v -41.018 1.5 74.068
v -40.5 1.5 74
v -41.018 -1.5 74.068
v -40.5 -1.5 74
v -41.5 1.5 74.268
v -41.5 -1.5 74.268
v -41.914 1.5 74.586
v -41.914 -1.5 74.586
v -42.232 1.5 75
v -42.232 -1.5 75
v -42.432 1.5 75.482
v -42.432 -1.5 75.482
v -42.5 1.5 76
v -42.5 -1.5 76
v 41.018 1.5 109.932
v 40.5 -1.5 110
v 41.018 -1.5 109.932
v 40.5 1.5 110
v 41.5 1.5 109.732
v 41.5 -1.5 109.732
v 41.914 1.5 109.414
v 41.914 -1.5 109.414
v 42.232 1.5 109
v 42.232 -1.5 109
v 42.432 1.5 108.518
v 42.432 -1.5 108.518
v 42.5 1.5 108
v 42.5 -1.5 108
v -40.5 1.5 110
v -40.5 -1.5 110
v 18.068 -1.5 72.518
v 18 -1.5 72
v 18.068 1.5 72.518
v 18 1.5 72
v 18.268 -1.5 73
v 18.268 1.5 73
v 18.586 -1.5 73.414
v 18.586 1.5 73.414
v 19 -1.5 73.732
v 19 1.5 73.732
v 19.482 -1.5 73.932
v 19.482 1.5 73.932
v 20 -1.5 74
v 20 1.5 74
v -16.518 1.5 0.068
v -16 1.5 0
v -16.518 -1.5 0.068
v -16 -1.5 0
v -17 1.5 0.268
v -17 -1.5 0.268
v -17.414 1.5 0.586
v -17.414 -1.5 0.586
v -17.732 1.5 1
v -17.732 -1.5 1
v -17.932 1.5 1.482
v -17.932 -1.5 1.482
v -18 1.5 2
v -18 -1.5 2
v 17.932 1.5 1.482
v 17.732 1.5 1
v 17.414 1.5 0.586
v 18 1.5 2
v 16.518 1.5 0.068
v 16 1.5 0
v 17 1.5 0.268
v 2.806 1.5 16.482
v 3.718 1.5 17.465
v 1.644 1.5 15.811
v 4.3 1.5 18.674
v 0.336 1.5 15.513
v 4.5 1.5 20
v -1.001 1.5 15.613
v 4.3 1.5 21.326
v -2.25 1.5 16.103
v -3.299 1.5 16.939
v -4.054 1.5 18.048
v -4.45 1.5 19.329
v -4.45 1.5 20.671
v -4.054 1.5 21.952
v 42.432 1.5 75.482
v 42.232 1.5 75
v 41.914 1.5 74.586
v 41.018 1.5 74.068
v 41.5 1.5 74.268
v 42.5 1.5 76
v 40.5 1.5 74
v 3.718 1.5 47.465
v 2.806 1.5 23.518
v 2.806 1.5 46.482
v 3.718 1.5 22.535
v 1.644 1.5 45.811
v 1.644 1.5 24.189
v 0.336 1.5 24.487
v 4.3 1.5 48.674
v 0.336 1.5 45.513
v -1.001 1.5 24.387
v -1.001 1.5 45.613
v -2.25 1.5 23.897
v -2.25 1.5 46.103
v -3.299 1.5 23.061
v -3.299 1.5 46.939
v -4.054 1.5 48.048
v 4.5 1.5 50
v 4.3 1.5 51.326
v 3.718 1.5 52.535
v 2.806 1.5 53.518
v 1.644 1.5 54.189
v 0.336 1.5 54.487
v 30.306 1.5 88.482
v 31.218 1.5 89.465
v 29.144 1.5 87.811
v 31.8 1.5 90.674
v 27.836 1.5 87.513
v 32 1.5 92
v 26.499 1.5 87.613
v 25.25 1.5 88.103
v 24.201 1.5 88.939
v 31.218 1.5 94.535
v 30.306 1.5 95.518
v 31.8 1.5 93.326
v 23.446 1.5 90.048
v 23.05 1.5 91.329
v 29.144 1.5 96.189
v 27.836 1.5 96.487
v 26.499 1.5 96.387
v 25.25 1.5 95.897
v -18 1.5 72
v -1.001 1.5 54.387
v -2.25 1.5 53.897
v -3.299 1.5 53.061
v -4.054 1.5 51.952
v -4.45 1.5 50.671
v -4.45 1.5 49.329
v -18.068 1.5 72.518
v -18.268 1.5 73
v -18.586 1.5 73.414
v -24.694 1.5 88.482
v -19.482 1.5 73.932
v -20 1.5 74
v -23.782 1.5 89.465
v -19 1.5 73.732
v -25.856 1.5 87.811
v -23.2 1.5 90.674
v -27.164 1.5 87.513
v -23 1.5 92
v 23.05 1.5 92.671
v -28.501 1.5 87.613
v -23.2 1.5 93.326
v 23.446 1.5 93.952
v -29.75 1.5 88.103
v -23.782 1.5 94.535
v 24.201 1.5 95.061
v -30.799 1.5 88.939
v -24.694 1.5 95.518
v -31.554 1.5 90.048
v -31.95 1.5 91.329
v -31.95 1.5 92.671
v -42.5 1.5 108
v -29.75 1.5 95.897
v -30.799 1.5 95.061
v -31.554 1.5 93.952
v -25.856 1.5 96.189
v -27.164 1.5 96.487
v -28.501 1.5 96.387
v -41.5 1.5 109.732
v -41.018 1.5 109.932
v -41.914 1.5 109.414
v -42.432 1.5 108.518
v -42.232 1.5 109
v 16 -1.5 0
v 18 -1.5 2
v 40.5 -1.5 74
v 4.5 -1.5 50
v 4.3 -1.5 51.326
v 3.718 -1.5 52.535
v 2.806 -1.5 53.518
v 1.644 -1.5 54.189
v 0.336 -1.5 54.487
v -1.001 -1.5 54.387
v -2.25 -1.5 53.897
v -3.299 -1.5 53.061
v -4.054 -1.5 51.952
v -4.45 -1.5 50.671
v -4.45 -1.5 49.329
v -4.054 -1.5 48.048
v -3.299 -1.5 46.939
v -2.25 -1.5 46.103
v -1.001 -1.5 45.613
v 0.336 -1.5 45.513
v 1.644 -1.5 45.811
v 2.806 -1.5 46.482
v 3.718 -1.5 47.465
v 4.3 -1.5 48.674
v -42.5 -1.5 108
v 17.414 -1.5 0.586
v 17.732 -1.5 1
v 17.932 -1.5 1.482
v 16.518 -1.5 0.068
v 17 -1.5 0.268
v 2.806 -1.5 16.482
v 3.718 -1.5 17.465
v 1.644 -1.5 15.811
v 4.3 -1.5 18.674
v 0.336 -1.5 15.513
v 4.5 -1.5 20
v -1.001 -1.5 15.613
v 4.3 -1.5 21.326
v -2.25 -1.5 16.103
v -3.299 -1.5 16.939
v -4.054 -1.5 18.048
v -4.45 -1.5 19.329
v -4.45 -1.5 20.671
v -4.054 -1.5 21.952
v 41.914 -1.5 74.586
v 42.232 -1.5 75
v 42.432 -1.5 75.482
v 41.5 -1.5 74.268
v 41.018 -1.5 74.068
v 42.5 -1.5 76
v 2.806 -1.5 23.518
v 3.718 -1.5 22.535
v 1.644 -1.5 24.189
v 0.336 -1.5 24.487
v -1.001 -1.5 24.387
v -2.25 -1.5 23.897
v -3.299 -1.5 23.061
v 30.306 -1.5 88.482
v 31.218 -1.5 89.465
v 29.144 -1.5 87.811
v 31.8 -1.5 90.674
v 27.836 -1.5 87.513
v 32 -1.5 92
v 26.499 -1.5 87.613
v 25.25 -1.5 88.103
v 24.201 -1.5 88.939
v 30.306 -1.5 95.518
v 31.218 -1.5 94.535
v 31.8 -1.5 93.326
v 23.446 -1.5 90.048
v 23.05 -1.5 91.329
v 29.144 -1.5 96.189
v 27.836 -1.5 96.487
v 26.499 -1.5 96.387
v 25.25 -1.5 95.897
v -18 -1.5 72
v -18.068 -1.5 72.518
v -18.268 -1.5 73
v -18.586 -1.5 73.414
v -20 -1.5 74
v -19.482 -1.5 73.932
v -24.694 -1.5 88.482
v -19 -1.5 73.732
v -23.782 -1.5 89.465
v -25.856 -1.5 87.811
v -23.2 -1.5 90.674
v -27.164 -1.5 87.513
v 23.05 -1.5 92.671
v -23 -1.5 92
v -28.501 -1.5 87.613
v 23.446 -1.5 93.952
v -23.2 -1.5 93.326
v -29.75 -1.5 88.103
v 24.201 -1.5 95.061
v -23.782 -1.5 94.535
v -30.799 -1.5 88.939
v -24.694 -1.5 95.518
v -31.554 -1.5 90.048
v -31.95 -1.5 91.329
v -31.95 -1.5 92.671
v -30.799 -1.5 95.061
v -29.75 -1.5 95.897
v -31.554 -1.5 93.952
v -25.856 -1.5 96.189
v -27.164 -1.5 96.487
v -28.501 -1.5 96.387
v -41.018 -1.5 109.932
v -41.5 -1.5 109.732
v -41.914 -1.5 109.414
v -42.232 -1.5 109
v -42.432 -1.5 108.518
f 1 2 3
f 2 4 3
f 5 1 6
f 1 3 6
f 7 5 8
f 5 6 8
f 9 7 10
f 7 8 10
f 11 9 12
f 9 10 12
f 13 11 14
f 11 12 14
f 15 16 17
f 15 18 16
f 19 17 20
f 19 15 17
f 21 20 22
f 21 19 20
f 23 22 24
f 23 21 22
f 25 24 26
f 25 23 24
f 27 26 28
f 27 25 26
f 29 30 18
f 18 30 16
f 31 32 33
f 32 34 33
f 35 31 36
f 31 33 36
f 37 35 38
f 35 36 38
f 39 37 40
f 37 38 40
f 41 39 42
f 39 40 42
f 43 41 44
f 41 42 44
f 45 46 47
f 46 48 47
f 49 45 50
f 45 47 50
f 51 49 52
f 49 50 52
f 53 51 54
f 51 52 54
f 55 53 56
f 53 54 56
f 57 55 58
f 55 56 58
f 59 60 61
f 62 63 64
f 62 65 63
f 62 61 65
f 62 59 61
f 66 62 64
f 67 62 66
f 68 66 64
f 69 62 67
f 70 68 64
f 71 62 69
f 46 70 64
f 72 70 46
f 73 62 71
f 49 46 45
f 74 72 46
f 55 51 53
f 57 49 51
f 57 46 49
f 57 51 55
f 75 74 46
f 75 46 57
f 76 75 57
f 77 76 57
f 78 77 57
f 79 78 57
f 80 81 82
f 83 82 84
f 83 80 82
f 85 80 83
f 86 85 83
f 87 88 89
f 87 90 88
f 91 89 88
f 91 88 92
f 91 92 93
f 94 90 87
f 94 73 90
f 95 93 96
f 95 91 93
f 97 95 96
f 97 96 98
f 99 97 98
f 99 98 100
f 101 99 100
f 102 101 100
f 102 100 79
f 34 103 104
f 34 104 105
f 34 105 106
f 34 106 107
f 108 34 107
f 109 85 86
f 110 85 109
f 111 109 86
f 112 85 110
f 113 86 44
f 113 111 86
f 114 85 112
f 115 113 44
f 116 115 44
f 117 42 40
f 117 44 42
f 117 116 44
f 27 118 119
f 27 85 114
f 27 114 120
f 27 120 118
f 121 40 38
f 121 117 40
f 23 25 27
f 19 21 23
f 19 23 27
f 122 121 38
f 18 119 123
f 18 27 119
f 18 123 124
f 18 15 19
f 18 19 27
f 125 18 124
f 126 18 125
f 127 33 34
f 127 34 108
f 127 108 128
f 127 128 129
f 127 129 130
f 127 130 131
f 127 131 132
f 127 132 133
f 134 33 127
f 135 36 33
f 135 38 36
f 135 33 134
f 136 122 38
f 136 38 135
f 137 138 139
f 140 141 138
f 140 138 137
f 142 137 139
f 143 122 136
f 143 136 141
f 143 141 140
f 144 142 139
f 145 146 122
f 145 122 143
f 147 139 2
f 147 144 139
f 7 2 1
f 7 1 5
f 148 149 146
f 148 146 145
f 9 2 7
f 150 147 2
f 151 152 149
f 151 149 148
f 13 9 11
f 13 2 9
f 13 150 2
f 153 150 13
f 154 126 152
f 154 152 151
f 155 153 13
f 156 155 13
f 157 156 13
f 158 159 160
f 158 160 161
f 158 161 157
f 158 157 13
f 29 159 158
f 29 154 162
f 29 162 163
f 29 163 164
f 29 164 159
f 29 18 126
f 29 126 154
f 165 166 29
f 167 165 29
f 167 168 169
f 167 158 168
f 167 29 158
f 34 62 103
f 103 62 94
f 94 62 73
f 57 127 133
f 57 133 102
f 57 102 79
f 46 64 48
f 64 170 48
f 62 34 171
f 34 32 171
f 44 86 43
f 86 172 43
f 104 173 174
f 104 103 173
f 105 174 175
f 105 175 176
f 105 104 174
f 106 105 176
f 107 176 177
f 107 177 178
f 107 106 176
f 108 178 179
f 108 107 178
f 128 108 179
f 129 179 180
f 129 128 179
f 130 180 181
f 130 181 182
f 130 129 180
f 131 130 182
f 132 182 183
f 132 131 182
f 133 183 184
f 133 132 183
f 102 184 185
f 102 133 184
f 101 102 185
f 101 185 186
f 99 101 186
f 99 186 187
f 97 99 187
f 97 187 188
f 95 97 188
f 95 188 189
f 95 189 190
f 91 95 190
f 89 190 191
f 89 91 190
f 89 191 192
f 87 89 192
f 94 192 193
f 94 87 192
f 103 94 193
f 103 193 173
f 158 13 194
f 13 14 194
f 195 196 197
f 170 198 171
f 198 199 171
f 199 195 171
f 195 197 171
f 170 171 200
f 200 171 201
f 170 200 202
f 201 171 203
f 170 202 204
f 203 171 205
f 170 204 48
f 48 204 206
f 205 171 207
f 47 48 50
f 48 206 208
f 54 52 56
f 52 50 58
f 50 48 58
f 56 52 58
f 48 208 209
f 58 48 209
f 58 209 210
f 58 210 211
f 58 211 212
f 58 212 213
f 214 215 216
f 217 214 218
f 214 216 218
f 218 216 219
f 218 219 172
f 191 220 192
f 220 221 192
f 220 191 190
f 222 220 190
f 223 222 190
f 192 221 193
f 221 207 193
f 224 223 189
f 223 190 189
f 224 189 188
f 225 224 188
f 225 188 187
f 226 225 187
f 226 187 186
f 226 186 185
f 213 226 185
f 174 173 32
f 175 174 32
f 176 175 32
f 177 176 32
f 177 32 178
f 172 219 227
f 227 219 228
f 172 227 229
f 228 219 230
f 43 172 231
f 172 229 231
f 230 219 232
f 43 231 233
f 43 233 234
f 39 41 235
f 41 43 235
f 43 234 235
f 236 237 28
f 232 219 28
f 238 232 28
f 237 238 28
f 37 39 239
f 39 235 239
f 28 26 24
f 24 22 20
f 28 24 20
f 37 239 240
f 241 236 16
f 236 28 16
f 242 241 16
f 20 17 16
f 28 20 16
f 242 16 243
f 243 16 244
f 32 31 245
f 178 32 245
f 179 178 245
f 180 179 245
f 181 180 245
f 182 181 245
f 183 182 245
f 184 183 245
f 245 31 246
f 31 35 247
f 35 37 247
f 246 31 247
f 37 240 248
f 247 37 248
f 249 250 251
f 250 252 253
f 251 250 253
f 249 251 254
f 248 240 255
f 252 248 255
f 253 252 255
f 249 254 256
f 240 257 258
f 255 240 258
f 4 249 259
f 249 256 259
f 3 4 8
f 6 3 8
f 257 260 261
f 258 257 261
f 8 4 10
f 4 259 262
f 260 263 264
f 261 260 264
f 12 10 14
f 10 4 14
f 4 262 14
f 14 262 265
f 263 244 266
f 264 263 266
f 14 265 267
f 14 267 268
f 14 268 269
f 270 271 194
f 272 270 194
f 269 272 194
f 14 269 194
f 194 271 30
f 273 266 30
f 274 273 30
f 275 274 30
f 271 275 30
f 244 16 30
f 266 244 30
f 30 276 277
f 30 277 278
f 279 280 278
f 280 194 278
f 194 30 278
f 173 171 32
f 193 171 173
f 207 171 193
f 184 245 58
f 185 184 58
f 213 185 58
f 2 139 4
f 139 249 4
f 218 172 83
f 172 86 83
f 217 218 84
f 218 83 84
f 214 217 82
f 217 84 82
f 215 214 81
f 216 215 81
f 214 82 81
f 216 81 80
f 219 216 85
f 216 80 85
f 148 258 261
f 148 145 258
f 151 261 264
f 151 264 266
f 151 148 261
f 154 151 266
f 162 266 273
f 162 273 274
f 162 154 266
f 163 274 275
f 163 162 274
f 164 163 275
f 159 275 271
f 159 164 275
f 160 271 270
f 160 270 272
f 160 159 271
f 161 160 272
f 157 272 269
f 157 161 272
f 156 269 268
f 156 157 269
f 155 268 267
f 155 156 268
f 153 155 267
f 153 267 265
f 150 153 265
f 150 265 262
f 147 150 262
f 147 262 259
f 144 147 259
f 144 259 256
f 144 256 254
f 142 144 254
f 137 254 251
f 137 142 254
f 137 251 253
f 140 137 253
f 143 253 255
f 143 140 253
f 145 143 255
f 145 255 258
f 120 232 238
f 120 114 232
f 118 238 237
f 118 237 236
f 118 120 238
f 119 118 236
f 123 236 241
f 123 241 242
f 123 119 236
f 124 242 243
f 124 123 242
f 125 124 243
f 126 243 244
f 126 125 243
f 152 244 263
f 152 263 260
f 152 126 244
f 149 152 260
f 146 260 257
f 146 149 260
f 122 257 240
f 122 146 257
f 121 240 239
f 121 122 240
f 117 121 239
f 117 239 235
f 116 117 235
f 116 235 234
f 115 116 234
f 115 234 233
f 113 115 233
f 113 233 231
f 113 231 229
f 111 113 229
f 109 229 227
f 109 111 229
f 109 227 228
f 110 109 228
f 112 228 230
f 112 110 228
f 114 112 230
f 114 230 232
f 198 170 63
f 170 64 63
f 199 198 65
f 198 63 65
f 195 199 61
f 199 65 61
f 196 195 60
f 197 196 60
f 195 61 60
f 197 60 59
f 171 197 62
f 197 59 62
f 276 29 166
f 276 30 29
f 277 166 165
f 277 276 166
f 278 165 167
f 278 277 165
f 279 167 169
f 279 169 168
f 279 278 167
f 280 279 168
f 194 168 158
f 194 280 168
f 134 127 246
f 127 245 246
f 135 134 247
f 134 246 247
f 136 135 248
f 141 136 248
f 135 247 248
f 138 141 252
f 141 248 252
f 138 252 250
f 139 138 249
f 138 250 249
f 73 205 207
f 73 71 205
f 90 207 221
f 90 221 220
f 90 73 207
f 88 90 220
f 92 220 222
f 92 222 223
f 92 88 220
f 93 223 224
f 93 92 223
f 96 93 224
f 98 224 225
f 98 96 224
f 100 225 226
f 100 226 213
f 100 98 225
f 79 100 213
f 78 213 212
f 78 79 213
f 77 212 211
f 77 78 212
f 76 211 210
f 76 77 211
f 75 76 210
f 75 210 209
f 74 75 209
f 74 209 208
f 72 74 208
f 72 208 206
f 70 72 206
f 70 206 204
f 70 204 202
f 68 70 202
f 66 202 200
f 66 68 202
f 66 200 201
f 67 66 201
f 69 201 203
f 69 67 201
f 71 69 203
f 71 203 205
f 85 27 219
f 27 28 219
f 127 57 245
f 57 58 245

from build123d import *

# Parameters (mm, degrees)
SKETCH_R  = 4.5
PAD_DEPTH = 1.5
FILLET_R  = 2


with BuildPart() as part:
    # Sketch → Pad (new body, symmetric)
    with BuildSketch(Plane.XZ):
        Polygon((-42.5, 110), (42.5, 110), (42.5, 74), (18, 74), (18, 0), (-18, 0), (-18, 74), (-42.5, 74), align=None)
        with Locations((-27.5, 92)):
            Circle(SKETCH_R, mode=Mode.SUBTRACT)
        with Locations((27.5, 92)):
            Circle(SKETCH_R, mode=Mode.SUBTRACT)
        with Locations((0, 20)):
            Circle(SKETCH_R, mode=Mode.SUBTRACT)
        with Locations((0, 50)):
            Circle(SKETCH_R, mode=Mode.SUBTRACT)
    extrude(amount=PAD_DEPTH, both=True)

    # Fillet
    fillet_edges = [part.edges().sort_by_distance(p)[0] for p in [
        (42.5, 0, 110),
        (42.5, 0, 74),
        (18, 0, 74),
        (-18, 0, 74),
        (-42.5, 0, 74),
        (-42.5, 0, 110),
        (18, 0, 0),
        (-18, 0, 0),
    ]]
    fillet(fillet_edges, radius=FILLET_R)


solid = part.part
